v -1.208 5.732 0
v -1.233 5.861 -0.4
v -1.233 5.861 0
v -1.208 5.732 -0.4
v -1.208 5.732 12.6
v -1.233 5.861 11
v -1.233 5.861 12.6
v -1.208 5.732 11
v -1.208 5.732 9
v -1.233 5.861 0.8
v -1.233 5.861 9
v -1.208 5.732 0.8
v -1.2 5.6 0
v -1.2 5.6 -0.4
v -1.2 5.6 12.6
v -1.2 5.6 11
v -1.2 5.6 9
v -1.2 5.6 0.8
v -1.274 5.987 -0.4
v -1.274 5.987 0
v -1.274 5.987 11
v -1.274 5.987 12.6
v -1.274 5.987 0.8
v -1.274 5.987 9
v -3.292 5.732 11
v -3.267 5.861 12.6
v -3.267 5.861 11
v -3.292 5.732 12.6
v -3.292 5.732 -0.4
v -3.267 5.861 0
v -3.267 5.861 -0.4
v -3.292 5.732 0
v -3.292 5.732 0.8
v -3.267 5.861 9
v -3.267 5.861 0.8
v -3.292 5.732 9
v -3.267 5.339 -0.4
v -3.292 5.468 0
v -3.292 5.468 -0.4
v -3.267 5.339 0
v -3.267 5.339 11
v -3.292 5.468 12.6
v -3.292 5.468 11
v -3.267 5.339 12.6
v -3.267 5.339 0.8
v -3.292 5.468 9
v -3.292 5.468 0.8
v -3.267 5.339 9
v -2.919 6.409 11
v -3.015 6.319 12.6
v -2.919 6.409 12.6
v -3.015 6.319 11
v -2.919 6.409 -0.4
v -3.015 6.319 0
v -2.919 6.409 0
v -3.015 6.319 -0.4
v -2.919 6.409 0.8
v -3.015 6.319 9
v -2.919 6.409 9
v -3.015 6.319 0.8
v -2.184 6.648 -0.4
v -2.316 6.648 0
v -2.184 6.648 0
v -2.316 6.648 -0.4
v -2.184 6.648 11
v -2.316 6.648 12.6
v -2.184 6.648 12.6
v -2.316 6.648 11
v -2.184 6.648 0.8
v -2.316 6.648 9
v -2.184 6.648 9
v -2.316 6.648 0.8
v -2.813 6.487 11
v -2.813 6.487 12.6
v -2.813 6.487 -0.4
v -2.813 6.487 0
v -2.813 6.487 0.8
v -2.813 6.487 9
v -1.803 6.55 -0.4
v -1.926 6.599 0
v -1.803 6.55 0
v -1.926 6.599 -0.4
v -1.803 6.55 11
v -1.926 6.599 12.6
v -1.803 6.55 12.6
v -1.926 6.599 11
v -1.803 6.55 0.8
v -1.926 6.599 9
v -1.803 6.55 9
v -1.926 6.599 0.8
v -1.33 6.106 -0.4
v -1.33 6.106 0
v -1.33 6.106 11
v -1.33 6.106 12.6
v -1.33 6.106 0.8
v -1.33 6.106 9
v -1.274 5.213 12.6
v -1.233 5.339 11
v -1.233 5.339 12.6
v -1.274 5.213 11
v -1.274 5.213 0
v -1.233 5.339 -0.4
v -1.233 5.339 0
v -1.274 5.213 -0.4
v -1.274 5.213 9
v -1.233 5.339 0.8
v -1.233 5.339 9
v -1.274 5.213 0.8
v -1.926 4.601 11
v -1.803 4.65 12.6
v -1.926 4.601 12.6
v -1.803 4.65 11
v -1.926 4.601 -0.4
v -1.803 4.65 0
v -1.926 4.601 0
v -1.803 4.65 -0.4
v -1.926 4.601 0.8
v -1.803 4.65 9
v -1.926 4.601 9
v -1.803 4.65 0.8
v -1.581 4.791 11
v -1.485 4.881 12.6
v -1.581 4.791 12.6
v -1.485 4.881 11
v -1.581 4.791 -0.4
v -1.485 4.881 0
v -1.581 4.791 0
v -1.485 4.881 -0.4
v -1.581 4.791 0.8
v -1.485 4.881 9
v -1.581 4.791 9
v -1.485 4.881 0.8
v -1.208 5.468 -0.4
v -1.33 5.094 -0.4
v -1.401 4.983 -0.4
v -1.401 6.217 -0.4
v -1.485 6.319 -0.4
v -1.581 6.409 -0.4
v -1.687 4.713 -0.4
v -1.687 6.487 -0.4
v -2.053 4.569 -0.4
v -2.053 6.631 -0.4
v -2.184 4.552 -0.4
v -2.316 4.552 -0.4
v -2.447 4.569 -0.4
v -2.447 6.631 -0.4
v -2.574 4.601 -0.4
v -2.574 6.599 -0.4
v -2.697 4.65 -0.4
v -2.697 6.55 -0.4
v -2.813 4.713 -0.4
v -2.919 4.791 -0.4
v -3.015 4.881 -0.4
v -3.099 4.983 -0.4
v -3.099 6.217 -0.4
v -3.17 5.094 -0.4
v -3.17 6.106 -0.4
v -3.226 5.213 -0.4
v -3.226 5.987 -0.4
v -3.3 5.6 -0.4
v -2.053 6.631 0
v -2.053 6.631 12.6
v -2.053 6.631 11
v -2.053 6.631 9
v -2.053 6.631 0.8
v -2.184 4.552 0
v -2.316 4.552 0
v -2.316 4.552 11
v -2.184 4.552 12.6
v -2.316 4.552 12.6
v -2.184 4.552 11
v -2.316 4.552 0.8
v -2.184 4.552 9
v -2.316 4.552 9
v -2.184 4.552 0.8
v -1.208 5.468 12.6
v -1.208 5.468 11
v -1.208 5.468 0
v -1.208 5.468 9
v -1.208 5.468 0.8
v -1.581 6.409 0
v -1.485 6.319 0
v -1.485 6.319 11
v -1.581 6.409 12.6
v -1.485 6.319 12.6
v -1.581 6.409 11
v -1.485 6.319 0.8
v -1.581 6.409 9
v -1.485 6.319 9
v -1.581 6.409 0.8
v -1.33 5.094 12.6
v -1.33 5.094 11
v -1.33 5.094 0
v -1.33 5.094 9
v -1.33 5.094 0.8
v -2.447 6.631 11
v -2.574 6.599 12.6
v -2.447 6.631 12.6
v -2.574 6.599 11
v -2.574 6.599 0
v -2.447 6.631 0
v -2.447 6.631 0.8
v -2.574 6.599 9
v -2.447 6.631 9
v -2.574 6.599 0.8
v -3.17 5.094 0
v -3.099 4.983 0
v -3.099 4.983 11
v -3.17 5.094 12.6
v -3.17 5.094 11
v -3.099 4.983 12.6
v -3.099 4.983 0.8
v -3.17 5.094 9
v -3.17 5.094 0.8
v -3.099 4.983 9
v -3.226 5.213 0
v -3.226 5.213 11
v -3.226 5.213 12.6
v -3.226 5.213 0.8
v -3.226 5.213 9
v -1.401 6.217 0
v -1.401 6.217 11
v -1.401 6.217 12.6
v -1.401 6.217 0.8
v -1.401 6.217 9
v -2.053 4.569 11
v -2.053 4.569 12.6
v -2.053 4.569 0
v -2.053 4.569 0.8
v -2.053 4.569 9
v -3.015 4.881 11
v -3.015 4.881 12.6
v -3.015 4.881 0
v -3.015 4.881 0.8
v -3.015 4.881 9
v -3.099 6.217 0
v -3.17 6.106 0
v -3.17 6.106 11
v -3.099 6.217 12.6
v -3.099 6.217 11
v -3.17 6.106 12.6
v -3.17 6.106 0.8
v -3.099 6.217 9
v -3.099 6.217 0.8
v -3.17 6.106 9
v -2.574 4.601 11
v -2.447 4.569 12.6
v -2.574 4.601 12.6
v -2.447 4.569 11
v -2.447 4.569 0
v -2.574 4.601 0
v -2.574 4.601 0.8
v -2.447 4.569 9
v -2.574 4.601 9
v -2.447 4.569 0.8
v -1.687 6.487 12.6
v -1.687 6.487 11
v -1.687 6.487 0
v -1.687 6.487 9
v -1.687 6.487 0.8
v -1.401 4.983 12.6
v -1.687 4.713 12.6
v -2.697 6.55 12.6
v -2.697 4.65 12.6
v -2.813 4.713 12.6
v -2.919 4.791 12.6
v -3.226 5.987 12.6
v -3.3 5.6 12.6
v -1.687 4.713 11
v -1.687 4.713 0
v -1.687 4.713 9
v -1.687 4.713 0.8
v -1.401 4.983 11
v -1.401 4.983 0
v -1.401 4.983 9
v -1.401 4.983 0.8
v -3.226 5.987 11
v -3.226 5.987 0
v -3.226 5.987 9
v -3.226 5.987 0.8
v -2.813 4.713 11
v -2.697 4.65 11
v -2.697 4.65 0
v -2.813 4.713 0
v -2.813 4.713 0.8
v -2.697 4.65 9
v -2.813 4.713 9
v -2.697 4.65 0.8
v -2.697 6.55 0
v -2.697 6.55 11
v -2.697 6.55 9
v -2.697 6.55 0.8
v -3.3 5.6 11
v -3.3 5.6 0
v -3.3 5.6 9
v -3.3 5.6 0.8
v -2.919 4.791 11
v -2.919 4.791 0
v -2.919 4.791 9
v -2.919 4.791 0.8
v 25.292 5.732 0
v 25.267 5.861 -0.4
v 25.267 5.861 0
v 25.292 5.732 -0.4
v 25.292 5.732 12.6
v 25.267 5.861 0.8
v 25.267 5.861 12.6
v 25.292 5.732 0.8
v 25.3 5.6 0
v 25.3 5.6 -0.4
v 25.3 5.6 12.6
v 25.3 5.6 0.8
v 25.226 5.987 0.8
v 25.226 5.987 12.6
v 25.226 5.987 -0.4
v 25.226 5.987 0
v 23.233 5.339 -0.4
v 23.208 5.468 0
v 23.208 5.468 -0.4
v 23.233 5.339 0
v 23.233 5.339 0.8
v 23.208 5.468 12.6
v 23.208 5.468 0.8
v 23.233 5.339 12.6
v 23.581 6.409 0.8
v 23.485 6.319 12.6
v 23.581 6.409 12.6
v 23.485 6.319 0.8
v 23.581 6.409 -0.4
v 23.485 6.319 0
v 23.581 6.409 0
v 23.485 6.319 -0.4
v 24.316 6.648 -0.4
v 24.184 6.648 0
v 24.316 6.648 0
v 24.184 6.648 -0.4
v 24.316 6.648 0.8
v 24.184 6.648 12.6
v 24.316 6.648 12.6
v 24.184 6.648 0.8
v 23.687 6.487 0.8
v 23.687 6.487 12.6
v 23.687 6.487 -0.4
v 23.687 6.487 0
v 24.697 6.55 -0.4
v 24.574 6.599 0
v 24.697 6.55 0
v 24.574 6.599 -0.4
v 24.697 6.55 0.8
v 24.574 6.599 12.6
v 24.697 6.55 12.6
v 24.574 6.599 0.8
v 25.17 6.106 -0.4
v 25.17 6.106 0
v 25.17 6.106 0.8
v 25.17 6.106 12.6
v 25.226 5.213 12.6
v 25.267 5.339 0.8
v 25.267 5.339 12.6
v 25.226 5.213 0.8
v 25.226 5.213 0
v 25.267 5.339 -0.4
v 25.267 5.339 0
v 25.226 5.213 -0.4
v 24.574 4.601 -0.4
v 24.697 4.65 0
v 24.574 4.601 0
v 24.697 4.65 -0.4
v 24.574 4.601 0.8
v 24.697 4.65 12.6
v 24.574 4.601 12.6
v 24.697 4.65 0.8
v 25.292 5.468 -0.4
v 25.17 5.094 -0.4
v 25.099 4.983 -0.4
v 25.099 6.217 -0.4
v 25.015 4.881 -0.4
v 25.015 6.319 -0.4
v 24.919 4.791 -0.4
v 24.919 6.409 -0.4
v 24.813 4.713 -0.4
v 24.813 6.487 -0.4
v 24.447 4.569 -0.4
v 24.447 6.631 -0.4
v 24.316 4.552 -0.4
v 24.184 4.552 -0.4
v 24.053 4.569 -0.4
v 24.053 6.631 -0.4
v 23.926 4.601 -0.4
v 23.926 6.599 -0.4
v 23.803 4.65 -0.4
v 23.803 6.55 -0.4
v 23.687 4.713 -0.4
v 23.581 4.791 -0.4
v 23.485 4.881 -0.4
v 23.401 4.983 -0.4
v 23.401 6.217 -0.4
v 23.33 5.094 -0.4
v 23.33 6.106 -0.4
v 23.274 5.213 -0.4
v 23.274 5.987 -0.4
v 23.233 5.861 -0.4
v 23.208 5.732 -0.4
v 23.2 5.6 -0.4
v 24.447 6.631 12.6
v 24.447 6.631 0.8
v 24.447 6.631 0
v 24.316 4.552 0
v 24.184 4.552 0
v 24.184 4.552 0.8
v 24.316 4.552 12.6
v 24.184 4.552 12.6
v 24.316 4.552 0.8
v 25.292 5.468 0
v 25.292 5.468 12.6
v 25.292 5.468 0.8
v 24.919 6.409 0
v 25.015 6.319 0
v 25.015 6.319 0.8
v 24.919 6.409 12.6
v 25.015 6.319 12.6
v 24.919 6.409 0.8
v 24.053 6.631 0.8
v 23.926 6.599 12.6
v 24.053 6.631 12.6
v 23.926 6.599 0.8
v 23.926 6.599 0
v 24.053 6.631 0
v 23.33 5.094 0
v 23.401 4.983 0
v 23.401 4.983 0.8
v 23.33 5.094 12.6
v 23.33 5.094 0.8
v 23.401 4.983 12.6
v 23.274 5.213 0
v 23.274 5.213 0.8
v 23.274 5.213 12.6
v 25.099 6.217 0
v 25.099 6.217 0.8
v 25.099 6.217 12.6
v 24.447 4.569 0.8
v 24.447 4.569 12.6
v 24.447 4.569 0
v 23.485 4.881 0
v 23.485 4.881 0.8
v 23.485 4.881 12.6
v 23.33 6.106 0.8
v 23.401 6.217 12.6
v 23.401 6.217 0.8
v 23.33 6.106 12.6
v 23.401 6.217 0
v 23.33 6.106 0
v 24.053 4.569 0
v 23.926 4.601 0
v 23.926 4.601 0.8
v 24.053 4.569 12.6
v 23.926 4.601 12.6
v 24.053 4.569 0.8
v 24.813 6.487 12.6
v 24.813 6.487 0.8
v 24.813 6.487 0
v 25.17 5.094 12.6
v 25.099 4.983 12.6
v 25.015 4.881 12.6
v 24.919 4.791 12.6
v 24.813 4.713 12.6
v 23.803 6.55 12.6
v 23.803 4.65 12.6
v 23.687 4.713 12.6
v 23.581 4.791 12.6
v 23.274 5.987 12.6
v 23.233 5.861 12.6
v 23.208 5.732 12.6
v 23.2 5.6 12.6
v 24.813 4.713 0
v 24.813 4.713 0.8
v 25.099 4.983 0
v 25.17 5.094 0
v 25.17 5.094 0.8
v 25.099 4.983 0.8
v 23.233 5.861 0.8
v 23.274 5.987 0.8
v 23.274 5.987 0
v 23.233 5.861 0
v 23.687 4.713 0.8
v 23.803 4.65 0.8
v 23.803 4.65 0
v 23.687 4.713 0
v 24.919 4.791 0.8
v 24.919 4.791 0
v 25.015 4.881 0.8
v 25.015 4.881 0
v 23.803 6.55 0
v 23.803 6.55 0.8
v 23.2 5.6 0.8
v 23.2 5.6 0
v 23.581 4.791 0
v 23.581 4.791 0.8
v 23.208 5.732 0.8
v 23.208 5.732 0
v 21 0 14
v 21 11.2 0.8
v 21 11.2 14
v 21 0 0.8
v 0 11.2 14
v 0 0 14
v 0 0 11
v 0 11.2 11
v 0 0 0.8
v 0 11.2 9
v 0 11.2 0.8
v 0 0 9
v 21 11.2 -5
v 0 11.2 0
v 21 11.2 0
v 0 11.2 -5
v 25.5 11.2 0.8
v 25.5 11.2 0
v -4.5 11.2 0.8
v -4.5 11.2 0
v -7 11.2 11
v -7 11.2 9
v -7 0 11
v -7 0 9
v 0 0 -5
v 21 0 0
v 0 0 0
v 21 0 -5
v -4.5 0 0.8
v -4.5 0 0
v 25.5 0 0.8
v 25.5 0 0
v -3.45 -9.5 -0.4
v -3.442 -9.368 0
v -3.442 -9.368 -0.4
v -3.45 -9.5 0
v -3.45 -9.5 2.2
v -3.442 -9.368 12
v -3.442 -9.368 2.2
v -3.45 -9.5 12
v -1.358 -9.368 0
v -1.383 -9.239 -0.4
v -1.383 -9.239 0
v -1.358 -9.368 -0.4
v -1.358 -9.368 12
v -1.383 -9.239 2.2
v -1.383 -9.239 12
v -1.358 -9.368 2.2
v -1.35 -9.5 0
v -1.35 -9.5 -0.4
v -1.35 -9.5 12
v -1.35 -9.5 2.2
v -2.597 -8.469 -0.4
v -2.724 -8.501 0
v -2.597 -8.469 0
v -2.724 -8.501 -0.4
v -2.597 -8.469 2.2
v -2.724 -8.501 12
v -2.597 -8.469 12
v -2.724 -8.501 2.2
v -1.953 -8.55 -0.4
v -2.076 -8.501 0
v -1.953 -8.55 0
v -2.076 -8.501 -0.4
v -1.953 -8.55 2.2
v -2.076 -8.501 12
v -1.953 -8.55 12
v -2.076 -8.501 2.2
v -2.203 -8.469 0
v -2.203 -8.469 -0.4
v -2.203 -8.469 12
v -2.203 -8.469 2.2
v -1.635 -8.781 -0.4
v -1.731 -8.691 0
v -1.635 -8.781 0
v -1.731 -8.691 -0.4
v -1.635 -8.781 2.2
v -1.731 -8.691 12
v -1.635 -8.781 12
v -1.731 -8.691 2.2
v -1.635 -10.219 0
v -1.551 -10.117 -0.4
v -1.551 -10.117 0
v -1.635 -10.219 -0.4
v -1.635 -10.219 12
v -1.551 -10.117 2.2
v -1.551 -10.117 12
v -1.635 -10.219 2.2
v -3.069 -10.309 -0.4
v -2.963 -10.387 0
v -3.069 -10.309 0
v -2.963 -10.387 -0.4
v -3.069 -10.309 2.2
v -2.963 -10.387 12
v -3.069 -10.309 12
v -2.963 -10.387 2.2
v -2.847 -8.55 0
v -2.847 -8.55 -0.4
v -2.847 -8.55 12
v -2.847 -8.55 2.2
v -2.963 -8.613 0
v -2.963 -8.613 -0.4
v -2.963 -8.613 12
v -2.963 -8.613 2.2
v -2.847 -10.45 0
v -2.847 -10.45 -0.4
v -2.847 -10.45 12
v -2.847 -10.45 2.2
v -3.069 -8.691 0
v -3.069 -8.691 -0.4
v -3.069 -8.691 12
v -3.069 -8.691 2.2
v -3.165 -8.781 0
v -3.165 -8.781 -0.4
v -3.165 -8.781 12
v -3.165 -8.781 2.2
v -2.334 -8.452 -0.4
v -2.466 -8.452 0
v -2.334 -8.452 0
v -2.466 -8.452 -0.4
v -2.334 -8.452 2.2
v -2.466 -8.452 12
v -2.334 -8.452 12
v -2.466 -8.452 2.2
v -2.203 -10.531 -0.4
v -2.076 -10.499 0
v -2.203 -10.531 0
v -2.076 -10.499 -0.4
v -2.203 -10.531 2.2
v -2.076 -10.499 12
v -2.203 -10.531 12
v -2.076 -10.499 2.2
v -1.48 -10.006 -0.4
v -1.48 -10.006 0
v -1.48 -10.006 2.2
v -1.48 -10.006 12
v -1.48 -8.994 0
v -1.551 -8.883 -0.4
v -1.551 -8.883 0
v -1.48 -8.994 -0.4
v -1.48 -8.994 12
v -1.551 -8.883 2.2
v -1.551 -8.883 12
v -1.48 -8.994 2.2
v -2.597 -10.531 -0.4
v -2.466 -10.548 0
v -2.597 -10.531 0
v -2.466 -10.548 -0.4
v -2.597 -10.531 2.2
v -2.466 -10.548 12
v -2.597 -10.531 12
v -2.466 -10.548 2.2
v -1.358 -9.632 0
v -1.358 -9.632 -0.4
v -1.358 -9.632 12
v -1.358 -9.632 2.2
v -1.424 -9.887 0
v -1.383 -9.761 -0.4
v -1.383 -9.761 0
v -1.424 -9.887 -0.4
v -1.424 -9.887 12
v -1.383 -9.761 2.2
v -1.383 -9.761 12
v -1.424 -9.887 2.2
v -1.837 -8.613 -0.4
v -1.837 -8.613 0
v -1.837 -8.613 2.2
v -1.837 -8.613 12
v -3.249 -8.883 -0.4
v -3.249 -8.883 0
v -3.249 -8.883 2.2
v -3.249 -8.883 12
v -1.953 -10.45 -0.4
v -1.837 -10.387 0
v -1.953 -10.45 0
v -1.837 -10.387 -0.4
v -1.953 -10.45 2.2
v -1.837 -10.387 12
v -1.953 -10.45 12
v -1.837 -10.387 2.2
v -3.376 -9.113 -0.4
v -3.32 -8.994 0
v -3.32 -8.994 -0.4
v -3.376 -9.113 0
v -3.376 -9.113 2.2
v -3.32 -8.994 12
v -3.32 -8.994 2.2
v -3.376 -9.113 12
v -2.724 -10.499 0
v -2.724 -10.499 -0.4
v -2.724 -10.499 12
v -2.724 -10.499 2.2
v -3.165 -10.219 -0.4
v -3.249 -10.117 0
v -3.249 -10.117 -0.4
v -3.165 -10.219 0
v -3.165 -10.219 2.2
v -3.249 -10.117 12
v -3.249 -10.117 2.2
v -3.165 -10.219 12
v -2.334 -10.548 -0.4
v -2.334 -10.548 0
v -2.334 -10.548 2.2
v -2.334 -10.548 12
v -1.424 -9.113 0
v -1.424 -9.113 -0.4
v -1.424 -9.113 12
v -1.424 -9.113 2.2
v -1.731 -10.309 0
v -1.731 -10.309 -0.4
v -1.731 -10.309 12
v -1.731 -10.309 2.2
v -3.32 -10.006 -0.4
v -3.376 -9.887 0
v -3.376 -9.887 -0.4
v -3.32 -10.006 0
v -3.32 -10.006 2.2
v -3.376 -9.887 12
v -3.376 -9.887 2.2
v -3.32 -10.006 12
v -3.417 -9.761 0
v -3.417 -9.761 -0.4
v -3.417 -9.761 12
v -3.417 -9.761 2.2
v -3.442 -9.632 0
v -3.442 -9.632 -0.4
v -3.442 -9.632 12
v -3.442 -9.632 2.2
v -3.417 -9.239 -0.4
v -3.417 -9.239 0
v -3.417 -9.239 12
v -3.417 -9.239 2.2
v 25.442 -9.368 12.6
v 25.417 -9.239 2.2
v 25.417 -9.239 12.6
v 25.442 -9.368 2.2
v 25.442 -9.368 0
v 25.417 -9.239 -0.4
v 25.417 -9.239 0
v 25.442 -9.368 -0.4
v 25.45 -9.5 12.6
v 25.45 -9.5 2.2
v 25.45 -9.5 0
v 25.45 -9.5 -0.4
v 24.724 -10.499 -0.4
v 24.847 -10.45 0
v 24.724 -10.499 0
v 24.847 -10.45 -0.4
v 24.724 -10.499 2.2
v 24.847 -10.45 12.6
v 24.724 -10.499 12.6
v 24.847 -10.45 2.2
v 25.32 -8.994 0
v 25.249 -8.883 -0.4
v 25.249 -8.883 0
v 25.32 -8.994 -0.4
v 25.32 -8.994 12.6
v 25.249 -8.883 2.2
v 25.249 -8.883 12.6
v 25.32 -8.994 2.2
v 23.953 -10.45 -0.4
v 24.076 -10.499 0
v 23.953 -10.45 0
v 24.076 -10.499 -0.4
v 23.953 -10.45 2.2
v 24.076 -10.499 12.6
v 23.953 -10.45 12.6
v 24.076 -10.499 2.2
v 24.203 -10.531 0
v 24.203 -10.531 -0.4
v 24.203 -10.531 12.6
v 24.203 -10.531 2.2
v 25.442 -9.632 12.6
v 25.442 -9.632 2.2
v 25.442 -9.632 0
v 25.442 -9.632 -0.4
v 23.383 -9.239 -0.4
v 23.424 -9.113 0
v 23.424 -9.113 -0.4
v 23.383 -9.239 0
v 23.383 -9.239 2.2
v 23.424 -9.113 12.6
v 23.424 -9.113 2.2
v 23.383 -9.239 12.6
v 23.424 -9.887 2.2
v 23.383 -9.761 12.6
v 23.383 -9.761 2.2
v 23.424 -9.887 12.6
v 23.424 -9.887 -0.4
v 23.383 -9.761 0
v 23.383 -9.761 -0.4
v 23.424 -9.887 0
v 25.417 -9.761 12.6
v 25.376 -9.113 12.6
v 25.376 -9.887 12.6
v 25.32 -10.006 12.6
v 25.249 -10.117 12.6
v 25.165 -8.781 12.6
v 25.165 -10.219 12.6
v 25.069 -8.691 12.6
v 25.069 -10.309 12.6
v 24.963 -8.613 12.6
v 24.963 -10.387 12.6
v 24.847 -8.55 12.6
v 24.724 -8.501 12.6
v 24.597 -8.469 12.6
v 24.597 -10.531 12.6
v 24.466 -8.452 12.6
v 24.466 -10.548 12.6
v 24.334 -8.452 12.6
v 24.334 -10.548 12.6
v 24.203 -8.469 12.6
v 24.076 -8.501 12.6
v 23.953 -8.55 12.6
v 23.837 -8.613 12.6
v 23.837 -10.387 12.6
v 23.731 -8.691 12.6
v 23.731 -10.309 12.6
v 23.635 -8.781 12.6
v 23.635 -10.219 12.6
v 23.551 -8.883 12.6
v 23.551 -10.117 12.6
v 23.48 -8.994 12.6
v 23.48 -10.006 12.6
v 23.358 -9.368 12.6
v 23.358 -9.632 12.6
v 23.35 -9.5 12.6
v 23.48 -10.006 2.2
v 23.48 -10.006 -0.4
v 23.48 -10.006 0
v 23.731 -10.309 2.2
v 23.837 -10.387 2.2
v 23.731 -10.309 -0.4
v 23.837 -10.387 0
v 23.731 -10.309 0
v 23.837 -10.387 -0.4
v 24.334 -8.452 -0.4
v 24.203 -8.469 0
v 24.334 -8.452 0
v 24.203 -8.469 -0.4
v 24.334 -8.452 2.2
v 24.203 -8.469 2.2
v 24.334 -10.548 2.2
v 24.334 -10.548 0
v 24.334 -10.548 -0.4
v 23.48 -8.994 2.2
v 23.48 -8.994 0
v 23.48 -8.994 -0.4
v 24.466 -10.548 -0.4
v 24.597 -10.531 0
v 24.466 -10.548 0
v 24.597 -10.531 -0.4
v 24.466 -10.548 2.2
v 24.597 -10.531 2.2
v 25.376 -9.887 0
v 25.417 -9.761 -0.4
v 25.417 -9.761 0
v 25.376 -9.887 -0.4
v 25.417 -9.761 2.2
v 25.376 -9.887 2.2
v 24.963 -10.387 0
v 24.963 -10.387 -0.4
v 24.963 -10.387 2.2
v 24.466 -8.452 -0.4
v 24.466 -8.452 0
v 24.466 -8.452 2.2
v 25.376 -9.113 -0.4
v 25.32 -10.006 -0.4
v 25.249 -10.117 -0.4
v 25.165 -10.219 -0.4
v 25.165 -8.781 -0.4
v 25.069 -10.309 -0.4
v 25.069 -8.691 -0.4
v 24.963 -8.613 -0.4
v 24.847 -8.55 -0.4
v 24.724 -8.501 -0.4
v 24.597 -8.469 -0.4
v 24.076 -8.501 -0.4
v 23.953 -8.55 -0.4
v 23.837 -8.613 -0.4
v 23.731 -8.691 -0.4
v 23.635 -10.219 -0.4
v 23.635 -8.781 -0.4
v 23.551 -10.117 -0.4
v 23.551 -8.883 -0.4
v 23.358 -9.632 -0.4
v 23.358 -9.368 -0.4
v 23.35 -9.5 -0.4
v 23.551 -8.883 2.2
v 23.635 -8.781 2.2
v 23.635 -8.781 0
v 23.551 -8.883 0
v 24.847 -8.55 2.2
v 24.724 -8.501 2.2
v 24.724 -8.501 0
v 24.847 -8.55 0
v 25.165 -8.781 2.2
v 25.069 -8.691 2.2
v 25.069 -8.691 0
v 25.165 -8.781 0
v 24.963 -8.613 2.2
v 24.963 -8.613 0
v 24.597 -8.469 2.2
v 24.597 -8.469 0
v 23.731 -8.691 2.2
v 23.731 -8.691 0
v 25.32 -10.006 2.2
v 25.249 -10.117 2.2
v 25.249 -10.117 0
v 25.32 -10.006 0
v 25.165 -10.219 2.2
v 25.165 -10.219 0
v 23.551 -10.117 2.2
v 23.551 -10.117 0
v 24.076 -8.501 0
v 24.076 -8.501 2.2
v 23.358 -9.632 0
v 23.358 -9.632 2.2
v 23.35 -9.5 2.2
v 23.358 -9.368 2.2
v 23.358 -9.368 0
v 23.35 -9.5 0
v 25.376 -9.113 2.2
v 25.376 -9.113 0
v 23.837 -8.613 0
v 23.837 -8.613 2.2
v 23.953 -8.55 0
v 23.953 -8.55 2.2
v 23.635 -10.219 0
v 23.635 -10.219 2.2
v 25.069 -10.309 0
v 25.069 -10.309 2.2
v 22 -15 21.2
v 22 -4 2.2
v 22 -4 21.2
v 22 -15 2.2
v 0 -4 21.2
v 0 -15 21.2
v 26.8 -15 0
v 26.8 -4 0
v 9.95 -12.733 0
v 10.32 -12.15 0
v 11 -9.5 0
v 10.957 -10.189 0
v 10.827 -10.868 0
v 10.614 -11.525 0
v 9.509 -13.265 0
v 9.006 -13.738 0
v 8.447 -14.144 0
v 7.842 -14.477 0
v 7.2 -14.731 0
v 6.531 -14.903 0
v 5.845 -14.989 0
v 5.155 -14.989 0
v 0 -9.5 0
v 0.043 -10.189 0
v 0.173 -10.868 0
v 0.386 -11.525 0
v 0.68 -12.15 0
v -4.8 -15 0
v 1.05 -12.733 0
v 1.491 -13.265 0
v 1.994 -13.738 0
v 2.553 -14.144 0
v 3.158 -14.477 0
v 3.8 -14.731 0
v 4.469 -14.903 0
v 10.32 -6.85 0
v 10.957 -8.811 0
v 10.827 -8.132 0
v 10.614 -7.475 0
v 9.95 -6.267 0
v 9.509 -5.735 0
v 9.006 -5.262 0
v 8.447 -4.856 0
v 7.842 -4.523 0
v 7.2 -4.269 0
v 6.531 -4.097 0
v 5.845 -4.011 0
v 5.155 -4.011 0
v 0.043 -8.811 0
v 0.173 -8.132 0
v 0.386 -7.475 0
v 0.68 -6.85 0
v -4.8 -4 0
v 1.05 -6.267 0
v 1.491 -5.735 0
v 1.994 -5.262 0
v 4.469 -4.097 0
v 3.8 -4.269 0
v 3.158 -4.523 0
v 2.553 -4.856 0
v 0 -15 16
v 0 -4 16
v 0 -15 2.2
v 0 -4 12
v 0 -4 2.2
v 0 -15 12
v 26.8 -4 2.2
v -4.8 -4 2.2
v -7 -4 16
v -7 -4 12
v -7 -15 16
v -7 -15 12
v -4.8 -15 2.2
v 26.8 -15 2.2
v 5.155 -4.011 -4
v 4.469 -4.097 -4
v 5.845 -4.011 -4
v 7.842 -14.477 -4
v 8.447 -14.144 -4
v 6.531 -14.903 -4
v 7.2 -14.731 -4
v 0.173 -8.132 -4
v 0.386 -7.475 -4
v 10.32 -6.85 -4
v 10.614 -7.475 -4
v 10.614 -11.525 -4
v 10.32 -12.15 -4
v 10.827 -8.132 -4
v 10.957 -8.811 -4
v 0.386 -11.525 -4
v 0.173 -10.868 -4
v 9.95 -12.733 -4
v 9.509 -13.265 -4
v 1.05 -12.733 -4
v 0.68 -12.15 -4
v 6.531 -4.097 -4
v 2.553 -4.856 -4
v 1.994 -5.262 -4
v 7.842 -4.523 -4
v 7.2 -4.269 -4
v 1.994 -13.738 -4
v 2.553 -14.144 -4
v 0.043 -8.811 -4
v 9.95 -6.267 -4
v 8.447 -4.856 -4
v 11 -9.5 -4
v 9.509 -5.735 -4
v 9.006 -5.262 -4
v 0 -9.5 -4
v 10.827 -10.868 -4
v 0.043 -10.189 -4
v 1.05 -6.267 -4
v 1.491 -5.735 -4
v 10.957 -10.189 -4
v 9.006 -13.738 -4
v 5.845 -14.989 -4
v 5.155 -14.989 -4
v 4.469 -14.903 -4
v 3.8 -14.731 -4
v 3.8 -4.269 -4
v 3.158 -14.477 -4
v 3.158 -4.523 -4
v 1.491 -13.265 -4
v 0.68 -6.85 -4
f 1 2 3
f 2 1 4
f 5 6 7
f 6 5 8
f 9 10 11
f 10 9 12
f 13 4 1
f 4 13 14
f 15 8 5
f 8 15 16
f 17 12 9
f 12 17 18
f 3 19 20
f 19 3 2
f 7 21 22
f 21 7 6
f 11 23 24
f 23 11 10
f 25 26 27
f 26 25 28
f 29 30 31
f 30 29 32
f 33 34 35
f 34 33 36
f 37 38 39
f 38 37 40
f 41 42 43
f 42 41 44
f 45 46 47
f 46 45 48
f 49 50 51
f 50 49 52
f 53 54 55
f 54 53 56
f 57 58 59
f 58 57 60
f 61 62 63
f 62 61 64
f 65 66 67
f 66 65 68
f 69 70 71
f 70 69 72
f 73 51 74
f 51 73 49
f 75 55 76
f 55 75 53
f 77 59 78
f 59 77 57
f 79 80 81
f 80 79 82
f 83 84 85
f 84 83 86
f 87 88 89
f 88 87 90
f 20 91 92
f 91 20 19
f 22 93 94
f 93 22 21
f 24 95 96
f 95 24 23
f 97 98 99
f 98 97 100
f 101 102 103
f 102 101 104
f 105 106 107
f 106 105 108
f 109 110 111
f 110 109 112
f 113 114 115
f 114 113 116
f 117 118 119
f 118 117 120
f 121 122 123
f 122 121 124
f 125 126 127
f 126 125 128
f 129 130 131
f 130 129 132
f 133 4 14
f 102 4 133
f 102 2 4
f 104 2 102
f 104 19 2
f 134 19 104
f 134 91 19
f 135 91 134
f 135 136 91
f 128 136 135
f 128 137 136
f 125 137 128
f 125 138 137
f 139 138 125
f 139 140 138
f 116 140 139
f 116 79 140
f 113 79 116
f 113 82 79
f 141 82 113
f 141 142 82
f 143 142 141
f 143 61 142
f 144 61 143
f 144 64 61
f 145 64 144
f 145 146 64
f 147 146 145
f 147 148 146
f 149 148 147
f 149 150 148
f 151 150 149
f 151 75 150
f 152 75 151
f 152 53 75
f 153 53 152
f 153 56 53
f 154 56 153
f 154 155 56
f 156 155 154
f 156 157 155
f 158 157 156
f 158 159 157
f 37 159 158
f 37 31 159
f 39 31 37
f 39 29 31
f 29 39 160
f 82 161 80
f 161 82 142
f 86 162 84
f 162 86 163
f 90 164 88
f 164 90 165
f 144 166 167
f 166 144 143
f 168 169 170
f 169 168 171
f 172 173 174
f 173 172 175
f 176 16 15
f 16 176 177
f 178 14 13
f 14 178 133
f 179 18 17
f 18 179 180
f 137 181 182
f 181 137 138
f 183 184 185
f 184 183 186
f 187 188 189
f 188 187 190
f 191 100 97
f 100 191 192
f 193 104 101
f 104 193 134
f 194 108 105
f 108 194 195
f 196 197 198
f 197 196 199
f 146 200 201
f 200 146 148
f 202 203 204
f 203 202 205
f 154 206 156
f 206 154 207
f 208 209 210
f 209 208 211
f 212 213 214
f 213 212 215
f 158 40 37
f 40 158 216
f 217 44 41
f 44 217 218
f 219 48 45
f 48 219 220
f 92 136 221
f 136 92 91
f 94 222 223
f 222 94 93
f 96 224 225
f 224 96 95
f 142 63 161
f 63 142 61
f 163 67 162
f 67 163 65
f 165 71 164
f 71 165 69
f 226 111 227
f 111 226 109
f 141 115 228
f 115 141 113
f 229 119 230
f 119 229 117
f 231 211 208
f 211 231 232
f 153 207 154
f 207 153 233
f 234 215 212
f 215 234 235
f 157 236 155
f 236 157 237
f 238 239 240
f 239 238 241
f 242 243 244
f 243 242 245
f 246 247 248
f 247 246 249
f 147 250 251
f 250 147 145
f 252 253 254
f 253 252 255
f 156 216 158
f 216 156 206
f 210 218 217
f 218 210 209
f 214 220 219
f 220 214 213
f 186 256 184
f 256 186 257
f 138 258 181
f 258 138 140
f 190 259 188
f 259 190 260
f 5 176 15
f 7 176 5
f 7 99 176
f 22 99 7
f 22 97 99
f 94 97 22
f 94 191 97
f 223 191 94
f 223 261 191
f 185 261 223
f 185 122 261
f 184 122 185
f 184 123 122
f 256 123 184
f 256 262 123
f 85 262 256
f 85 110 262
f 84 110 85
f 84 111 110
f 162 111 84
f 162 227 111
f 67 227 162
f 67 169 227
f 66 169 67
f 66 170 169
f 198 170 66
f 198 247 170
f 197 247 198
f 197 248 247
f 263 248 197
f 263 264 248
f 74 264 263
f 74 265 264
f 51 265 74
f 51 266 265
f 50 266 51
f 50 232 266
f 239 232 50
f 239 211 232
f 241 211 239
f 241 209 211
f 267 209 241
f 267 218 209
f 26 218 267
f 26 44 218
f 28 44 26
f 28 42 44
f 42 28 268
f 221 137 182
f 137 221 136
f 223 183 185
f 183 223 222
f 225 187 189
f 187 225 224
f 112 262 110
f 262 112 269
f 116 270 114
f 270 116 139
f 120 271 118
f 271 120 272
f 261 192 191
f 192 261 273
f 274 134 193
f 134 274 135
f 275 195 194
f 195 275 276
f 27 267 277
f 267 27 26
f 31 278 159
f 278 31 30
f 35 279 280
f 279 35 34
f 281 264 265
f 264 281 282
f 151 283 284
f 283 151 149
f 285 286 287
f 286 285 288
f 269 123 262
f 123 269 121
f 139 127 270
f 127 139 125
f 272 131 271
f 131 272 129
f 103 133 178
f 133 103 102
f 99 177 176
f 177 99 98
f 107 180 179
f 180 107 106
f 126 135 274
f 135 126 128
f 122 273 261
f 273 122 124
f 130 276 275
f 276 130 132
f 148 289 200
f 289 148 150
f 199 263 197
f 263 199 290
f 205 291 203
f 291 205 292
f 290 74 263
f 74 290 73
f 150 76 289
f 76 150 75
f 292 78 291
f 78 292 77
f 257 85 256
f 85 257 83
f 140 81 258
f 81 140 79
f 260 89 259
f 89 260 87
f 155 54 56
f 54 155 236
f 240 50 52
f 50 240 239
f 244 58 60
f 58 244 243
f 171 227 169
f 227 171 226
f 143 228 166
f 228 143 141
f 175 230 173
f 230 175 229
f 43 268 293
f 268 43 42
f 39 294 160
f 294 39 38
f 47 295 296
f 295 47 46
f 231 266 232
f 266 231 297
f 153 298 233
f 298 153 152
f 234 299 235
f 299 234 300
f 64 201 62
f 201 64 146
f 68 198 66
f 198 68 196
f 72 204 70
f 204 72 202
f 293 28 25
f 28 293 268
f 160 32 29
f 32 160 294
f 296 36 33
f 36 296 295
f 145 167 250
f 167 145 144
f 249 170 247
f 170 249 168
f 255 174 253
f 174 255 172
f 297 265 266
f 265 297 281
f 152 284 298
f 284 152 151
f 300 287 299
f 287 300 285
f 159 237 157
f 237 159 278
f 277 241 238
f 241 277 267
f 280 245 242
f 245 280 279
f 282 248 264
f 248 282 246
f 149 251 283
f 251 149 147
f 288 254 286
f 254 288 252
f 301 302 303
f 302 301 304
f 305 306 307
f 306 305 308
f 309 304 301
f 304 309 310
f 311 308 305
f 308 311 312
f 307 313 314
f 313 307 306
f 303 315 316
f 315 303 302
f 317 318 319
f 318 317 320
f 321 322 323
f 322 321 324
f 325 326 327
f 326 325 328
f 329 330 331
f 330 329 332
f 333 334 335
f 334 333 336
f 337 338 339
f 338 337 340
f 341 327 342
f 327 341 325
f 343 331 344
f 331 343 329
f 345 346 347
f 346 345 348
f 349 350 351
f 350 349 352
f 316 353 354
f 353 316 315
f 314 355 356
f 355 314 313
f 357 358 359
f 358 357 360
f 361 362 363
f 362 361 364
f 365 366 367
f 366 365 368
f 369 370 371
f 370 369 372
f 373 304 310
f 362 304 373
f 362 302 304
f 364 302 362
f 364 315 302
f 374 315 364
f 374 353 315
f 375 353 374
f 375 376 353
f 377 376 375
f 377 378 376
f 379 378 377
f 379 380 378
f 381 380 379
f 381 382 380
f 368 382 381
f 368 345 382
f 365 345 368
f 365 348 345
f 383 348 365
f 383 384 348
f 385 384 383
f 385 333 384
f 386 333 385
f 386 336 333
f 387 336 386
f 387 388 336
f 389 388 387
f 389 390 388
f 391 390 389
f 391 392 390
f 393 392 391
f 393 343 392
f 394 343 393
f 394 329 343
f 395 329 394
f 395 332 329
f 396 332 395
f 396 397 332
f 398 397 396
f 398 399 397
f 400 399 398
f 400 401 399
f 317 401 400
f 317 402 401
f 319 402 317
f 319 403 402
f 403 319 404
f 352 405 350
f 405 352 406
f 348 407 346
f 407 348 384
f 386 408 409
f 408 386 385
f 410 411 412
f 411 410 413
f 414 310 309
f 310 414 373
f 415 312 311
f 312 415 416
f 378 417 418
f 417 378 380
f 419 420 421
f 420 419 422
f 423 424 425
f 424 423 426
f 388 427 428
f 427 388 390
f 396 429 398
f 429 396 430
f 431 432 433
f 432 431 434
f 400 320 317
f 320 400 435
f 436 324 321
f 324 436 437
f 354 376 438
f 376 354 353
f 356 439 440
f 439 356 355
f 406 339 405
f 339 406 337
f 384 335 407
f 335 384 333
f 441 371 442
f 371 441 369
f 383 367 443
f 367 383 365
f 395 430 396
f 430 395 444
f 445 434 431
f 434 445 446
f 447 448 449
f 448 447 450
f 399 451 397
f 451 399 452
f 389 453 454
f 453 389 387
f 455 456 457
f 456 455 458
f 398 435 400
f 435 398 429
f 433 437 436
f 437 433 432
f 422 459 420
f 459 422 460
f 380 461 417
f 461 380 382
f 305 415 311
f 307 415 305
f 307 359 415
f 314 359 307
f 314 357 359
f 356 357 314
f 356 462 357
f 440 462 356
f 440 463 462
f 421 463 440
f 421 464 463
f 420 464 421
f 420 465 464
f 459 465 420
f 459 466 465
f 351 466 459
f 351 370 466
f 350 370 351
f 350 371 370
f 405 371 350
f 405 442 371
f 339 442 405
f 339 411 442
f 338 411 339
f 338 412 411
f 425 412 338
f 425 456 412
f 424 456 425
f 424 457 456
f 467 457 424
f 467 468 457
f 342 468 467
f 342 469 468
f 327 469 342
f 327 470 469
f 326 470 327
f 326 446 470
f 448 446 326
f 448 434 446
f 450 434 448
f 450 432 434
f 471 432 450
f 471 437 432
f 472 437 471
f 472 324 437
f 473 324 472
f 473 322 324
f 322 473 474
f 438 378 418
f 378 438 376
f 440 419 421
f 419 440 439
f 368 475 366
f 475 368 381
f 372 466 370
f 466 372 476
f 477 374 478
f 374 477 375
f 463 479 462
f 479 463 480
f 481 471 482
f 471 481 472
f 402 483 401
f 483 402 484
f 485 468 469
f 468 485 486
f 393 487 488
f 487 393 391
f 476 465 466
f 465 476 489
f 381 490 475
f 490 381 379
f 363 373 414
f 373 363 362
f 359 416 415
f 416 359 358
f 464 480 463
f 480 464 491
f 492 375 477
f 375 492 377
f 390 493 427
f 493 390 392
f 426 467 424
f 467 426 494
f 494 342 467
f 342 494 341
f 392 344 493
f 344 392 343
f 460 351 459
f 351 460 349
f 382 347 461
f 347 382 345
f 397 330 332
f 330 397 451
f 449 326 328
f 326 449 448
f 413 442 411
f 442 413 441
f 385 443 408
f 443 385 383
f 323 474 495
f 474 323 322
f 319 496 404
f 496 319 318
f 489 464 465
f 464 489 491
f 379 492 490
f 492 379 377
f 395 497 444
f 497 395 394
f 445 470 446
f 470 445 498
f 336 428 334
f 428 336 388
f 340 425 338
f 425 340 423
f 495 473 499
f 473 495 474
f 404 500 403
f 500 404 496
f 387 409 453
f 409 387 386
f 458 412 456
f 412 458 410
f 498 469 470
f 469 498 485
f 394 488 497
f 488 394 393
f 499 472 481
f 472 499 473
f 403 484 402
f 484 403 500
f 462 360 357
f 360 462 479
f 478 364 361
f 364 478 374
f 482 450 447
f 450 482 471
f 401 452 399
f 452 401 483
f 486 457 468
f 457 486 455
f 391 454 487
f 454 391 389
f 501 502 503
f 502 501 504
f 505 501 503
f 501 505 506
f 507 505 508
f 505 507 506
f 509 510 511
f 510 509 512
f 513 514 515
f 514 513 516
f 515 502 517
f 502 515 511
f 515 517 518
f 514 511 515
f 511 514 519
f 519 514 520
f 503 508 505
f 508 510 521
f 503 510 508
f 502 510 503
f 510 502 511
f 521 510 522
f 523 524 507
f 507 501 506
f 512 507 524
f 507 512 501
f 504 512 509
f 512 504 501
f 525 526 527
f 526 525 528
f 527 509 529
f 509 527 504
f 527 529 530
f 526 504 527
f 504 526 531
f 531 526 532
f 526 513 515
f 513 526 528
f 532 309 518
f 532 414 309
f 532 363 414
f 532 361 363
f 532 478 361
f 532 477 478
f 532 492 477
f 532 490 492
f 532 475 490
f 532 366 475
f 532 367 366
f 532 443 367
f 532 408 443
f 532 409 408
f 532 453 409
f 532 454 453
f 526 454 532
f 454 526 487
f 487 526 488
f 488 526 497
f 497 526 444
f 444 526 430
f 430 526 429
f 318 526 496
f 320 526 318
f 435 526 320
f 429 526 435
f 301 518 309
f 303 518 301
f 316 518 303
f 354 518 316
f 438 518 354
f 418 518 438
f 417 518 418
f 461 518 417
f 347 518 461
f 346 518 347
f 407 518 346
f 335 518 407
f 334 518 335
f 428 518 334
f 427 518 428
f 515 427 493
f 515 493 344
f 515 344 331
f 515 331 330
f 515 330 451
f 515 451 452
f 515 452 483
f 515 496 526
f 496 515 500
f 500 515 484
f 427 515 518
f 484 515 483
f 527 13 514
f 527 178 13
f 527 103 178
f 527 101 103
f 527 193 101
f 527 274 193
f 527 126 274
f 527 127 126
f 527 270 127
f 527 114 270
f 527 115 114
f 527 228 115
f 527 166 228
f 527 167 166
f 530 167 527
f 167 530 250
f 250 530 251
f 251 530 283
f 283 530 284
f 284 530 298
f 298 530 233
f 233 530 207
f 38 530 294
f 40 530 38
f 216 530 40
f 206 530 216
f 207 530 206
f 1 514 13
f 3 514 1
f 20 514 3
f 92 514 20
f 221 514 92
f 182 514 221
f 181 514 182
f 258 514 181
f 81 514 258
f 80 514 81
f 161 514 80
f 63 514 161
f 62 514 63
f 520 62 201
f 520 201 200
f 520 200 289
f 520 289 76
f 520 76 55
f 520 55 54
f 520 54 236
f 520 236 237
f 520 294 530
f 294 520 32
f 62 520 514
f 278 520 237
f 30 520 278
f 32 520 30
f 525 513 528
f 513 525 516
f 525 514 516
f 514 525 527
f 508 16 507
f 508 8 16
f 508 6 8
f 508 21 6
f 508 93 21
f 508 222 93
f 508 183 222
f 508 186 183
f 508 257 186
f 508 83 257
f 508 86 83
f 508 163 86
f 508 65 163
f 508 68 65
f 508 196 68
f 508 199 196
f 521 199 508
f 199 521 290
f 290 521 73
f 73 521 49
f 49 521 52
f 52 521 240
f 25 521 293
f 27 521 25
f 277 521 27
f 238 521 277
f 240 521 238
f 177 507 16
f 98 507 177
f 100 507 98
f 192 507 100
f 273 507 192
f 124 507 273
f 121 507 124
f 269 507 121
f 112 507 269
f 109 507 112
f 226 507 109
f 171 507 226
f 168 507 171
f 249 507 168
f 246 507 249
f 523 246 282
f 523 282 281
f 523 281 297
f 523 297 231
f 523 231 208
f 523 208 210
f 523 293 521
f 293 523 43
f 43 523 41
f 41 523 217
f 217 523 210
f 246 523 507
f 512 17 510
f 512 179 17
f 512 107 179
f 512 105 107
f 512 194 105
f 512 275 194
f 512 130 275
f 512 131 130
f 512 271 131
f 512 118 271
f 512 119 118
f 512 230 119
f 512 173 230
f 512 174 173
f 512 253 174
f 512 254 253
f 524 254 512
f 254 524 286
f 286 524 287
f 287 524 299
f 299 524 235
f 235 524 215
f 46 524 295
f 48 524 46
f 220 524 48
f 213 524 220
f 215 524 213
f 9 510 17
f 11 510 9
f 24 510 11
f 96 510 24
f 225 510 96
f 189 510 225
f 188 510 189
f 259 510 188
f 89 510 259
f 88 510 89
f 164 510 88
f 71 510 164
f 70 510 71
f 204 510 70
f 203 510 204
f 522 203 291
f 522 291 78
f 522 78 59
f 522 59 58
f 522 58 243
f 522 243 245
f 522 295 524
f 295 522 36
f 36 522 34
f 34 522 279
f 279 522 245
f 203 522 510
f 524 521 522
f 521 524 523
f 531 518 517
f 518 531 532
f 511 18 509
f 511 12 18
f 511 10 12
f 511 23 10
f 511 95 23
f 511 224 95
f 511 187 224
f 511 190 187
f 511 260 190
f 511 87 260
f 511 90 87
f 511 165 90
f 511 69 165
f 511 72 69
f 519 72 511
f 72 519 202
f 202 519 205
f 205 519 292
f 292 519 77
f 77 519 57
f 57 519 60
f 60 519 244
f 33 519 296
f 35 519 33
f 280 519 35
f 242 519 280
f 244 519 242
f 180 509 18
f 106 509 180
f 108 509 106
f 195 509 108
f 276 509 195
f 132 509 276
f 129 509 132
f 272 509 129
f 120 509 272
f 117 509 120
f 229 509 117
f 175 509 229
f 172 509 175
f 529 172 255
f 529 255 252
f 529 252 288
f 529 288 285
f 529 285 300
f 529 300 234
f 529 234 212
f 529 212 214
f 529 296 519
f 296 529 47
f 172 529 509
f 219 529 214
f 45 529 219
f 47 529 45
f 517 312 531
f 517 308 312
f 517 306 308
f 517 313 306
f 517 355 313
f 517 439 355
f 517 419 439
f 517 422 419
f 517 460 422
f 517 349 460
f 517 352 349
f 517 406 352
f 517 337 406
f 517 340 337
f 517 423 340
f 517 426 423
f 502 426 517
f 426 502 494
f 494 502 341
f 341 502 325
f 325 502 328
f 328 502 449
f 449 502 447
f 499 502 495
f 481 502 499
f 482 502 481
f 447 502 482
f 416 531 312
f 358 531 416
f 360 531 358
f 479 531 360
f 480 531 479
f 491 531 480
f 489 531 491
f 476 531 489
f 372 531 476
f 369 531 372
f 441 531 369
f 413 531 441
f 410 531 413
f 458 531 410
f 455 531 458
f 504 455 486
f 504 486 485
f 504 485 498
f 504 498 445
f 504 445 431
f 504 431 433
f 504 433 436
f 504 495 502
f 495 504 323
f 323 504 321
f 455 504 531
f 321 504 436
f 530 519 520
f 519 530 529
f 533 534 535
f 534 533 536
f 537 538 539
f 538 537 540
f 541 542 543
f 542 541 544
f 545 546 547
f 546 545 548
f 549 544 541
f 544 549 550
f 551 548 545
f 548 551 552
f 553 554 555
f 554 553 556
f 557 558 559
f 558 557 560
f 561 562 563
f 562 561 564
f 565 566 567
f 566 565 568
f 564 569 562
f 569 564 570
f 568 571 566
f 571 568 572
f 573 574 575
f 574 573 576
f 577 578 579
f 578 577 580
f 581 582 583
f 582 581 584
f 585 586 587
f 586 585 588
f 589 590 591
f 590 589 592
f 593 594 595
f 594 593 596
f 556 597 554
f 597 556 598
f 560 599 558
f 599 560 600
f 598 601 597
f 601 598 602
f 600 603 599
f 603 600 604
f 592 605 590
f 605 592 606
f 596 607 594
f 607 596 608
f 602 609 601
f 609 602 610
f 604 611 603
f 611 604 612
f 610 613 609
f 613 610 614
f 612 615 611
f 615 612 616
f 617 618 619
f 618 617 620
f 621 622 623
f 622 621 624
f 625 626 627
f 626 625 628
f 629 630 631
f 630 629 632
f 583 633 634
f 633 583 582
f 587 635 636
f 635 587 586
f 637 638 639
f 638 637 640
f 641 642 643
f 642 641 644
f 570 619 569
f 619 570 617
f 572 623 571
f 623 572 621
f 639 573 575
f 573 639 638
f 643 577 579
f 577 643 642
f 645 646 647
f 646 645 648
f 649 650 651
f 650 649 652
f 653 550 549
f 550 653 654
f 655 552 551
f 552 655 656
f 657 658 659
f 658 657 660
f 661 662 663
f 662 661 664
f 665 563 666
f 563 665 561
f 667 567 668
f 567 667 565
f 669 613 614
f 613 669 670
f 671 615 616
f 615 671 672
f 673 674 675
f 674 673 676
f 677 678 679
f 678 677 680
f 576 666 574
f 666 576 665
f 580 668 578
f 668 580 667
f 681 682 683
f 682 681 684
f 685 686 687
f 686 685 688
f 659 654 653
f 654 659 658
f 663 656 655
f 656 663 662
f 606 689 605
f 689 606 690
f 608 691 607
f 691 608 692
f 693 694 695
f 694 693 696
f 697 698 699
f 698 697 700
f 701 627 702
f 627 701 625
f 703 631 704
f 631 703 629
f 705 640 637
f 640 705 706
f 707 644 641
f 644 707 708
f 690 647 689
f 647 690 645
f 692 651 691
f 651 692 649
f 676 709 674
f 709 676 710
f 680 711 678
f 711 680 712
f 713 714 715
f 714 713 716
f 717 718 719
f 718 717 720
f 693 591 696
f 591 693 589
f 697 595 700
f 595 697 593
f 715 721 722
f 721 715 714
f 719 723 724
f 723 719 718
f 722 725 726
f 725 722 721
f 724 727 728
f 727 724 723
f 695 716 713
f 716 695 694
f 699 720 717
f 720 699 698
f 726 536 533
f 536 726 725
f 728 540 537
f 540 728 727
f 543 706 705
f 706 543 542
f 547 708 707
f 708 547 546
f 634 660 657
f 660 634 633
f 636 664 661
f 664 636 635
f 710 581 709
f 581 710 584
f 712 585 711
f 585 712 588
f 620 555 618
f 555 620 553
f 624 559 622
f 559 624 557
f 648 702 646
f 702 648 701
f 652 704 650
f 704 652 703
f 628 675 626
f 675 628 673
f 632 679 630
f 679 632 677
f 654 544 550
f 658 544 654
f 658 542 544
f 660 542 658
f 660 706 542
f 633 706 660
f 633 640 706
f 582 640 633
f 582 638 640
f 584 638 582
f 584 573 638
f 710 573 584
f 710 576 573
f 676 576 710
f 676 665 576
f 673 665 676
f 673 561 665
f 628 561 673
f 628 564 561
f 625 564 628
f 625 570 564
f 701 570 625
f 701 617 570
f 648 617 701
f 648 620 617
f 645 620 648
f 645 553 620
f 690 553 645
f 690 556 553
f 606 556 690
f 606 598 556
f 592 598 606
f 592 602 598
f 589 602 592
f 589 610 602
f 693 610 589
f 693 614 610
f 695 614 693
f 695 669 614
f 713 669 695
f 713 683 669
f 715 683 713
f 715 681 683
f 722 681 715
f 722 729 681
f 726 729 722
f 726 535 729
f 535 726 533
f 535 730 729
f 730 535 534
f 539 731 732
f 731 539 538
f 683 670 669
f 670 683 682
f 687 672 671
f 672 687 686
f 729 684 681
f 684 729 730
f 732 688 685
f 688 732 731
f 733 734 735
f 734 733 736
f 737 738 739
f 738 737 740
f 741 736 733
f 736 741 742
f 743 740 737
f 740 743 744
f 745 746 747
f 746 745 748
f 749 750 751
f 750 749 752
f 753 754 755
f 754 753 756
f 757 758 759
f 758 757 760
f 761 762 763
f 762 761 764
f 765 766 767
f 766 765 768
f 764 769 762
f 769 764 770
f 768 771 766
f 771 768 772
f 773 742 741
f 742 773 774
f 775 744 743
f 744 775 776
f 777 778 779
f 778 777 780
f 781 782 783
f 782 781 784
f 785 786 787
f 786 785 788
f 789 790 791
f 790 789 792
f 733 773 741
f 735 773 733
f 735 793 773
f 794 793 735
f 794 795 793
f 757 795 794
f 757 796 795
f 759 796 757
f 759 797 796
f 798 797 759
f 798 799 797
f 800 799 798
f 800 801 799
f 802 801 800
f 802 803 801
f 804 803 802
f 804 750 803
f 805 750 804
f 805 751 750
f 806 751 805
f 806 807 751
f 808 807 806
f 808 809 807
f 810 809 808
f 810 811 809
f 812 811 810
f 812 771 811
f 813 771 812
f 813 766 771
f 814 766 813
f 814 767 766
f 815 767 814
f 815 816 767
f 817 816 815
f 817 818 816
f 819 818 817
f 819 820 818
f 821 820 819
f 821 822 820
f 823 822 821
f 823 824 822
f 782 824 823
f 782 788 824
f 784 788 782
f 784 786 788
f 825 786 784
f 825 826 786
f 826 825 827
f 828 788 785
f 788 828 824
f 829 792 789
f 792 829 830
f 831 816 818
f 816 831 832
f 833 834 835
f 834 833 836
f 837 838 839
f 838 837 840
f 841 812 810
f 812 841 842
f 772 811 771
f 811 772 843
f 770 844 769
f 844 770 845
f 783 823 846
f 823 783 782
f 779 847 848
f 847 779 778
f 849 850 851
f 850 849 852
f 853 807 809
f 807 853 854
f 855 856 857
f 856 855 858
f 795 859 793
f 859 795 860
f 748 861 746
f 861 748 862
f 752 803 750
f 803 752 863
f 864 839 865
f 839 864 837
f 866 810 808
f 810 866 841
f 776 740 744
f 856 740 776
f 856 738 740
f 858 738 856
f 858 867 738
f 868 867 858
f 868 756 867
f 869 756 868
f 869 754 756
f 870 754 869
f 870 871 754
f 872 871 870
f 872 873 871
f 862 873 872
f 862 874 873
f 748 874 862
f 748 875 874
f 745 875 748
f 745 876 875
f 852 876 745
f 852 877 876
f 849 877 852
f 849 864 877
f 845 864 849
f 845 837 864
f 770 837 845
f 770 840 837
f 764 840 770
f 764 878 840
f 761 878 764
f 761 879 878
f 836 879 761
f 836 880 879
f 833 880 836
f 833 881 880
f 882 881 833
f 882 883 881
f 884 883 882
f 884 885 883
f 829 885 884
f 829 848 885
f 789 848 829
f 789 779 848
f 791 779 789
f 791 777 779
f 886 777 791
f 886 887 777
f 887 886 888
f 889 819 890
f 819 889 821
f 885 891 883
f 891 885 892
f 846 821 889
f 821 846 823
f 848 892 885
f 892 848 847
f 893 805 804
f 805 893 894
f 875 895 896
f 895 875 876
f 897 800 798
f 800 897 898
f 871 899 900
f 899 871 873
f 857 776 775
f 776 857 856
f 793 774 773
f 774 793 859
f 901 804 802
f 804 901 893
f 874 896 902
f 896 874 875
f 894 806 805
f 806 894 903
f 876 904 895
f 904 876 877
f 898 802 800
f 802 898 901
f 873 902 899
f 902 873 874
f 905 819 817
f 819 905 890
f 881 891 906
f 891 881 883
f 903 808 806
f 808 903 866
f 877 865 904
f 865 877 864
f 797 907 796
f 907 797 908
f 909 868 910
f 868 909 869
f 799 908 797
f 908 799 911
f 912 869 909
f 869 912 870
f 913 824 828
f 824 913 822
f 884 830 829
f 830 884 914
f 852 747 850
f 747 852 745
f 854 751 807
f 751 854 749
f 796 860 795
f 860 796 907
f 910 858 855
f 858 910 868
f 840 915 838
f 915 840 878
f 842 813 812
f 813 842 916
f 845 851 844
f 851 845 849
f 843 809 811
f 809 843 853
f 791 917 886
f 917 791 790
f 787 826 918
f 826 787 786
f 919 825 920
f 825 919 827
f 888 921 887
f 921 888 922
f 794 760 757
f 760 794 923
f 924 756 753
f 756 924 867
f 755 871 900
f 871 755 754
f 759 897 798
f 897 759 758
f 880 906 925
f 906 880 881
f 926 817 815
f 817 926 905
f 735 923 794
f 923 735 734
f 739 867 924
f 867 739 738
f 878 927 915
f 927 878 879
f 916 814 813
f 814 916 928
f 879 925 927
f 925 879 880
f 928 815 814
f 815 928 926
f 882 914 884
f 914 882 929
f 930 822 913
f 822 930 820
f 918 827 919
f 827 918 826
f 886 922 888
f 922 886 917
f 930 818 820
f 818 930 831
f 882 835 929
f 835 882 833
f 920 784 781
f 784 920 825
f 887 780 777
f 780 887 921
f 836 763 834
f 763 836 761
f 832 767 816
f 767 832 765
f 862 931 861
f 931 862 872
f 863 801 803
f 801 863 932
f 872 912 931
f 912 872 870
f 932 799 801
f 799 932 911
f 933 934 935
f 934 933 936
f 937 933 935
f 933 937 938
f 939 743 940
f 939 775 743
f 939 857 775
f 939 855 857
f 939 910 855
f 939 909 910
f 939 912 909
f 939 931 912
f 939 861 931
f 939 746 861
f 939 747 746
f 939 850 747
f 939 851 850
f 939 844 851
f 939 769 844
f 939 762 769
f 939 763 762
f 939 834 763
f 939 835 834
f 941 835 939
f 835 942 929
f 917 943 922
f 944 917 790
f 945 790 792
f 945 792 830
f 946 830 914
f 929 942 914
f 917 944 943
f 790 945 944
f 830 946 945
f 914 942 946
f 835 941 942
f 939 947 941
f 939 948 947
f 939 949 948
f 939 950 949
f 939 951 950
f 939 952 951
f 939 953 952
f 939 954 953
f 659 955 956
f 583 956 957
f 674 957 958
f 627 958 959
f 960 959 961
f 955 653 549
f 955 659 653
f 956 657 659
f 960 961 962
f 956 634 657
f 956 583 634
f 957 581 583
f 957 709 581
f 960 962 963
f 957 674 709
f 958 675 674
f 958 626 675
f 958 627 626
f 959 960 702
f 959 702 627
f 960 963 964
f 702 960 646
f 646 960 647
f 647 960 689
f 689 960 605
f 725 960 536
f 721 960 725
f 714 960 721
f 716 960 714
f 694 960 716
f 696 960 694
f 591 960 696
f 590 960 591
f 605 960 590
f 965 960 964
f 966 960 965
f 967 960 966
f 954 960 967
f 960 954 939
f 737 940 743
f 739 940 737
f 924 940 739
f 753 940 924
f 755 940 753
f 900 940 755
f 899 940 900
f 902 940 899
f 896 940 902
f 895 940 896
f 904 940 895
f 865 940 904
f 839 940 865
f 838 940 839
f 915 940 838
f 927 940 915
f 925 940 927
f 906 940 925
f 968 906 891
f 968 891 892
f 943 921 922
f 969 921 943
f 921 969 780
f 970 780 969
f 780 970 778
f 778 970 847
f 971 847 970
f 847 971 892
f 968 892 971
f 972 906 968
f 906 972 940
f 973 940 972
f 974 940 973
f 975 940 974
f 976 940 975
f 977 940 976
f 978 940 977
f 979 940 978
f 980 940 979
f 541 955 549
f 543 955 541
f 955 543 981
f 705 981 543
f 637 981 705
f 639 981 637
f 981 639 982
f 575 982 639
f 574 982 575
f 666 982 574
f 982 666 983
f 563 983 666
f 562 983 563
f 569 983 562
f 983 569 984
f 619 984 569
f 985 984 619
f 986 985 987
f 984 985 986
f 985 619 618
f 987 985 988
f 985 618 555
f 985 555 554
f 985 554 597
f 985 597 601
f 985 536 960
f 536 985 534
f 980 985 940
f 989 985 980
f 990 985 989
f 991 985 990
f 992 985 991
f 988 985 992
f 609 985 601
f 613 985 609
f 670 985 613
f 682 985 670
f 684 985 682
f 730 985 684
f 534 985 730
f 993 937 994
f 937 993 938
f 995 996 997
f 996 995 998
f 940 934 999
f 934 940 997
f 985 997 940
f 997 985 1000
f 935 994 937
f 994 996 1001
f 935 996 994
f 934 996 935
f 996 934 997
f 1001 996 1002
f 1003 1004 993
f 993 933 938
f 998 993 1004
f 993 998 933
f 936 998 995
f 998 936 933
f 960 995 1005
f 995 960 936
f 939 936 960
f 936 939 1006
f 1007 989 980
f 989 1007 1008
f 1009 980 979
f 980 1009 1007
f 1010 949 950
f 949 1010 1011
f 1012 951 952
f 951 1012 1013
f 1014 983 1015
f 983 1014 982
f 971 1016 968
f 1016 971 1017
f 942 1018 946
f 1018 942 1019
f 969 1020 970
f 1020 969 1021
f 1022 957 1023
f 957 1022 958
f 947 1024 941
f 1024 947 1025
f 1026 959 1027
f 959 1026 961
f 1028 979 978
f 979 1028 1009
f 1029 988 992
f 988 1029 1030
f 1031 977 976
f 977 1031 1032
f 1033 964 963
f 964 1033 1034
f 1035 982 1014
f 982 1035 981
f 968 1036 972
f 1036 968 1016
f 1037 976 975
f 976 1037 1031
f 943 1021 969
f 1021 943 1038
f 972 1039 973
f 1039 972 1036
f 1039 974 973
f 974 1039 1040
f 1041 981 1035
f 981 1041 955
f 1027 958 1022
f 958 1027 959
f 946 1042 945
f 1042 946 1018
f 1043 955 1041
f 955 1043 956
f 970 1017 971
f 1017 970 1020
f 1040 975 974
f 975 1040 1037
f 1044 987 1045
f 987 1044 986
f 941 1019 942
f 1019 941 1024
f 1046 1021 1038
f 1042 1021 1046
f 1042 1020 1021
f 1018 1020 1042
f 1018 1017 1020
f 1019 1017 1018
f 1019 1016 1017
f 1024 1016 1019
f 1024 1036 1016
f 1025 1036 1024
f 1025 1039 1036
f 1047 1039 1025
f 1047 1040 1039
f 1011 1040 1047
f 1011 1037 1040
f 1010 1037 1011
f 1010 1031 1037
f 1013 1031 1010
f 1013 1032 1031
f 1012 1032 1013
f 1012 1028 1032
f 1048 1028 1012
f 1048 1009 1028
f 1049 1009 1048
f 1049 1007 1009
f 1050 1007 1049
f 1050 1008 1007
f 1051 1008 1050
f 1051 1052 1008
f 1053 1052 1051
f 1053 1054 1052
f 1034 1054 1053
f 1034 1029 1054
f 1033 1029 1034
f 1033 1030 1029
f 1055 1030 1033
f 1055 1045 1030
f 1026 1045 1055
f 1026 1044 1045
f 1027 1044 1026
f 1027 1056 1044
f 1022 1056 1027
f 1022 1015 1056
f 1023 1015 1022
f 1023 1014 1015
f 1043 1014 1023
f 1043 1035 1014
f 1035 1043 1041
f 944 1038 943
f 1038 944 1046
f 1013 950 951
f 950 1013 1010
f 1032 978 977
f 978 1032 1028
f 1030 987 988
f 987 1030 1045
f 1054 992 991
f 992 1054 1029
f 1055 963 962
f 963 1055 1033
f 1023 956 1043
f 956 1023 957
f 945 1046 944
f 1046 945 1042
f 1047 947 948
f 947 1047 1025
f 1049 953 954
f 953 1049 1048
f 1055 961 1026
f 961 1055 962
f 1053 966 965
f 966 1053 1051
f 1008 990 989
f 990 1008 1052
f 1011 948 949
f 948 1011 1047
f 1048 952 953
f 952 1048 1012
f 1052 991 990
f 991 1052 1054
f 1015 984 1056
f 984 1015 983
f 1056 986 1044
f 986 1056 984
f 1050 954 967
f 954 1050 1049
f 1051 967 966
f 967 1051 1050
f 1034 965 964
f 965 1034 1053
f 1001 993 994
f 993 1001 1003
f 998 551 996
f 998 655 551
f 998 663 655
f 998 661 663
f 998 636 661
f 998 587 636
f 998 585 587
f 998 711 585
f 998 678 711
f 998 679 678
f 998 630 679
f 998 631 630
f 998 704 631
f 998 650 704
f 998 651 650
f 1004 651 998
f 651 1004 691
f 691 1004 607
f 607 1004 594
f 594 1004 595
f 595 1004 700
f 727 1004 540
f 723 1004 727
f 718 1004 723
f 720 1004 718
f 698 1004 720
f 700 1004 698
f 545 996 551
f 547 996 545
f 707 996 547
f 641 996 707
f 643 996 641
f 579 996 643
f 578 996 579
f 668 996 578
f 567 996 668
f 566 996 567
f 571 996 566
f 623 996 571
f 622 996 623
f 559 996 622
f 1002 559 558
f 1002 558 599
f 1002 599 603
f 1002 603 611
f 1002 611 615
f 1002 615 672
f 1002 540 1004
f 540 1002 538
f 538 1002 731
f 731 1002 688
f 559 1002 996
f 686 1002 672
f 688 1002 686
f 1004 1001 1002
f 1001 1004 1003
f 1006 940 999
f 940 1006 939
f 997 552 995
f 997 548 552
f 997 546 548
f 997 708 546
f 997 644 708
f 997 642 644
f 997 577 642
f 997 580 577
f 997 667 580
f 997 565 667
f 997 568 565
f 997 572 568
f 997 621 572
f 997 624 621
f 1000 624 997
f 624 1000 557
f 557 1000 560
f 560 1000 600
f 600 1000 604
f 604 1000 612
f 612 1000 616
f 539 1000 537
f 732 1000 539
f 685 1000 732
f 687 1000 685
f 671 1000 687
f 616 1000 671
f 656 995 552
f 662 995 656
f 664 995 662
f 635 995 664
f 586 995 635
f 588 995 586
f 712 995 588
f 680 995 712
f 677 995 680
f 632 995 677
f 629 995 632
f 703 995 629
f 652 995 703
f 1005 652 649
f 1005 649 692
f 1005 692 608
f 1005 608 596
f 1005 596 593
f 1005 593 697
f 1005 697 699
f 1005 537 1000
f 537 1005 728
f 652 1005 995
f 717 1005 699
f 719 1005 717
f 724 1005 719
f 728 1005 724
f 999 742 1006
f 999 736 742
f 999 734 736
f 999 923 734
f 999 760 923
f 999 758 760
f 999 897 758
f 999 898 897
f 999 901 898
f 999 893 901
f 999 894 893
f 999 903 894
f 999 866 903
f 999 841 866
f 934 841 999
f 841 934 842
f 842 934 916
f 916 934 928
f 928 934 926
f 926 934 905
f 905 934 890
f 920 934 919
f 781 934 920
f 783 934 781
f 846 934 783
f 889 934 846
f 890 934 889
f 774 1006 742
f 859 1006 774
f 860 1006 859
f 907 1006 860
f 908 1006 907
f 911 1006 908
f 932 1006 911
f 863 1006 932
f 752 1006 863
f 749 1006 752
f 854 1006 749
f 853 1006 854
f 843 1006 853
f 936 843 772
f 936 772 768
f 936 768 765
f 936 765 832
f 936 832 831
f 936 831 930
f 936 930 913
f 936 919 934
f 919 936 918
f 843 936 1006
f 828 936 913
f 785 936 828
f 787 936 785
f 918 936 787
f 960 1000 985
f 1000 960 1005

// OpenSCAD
$fn=50;

module miniServo_noir(){
	color("black"){
		cube([22, 11, 21.2]);
		translate([11/2,11/2,-4]) cylinder(h=4, r=11/2);
		translate([-7, 0, 12]) cube([7, 11, 4]);
//		difference(){
			translate([(22-31.6)/2, 0, 0]) cube([31.6,11, 2.2]);
			union(){
				translate([(22-31.6)/4, 11/2, -0.4]) cylinder(r=1.05, h=13);
				translate([-(22-31.6)/4+22, 11/2, -0.4]) cylinder(r=1.05, h=13);
//			}
		}
	}
}

module miniServo_transparent(){
	color("gray"){
		cube([21, 11.2, 14]);
		translate([0,0,-5]) cube([21, 11.2, 5]);
		translate([-7, 0, 9]) cube([7, 11.2, 2]);
		//difference(){
			translate([(21-30)/2, 0, 0]) cube([30, 11.2, 0.8]);
			union(){
				translate([(21-30)/4, 11.2/2, -0.4]) cylinder(r=1.05, h=13);
				translate([-(21-30)/4+22, 11.2/2, -0.4]) cylinder(r=1.05, h=13);
		//	}
		}
	}
}


miniServo_transparent();
translate([0, -15, 0]) miniServo_noir();
